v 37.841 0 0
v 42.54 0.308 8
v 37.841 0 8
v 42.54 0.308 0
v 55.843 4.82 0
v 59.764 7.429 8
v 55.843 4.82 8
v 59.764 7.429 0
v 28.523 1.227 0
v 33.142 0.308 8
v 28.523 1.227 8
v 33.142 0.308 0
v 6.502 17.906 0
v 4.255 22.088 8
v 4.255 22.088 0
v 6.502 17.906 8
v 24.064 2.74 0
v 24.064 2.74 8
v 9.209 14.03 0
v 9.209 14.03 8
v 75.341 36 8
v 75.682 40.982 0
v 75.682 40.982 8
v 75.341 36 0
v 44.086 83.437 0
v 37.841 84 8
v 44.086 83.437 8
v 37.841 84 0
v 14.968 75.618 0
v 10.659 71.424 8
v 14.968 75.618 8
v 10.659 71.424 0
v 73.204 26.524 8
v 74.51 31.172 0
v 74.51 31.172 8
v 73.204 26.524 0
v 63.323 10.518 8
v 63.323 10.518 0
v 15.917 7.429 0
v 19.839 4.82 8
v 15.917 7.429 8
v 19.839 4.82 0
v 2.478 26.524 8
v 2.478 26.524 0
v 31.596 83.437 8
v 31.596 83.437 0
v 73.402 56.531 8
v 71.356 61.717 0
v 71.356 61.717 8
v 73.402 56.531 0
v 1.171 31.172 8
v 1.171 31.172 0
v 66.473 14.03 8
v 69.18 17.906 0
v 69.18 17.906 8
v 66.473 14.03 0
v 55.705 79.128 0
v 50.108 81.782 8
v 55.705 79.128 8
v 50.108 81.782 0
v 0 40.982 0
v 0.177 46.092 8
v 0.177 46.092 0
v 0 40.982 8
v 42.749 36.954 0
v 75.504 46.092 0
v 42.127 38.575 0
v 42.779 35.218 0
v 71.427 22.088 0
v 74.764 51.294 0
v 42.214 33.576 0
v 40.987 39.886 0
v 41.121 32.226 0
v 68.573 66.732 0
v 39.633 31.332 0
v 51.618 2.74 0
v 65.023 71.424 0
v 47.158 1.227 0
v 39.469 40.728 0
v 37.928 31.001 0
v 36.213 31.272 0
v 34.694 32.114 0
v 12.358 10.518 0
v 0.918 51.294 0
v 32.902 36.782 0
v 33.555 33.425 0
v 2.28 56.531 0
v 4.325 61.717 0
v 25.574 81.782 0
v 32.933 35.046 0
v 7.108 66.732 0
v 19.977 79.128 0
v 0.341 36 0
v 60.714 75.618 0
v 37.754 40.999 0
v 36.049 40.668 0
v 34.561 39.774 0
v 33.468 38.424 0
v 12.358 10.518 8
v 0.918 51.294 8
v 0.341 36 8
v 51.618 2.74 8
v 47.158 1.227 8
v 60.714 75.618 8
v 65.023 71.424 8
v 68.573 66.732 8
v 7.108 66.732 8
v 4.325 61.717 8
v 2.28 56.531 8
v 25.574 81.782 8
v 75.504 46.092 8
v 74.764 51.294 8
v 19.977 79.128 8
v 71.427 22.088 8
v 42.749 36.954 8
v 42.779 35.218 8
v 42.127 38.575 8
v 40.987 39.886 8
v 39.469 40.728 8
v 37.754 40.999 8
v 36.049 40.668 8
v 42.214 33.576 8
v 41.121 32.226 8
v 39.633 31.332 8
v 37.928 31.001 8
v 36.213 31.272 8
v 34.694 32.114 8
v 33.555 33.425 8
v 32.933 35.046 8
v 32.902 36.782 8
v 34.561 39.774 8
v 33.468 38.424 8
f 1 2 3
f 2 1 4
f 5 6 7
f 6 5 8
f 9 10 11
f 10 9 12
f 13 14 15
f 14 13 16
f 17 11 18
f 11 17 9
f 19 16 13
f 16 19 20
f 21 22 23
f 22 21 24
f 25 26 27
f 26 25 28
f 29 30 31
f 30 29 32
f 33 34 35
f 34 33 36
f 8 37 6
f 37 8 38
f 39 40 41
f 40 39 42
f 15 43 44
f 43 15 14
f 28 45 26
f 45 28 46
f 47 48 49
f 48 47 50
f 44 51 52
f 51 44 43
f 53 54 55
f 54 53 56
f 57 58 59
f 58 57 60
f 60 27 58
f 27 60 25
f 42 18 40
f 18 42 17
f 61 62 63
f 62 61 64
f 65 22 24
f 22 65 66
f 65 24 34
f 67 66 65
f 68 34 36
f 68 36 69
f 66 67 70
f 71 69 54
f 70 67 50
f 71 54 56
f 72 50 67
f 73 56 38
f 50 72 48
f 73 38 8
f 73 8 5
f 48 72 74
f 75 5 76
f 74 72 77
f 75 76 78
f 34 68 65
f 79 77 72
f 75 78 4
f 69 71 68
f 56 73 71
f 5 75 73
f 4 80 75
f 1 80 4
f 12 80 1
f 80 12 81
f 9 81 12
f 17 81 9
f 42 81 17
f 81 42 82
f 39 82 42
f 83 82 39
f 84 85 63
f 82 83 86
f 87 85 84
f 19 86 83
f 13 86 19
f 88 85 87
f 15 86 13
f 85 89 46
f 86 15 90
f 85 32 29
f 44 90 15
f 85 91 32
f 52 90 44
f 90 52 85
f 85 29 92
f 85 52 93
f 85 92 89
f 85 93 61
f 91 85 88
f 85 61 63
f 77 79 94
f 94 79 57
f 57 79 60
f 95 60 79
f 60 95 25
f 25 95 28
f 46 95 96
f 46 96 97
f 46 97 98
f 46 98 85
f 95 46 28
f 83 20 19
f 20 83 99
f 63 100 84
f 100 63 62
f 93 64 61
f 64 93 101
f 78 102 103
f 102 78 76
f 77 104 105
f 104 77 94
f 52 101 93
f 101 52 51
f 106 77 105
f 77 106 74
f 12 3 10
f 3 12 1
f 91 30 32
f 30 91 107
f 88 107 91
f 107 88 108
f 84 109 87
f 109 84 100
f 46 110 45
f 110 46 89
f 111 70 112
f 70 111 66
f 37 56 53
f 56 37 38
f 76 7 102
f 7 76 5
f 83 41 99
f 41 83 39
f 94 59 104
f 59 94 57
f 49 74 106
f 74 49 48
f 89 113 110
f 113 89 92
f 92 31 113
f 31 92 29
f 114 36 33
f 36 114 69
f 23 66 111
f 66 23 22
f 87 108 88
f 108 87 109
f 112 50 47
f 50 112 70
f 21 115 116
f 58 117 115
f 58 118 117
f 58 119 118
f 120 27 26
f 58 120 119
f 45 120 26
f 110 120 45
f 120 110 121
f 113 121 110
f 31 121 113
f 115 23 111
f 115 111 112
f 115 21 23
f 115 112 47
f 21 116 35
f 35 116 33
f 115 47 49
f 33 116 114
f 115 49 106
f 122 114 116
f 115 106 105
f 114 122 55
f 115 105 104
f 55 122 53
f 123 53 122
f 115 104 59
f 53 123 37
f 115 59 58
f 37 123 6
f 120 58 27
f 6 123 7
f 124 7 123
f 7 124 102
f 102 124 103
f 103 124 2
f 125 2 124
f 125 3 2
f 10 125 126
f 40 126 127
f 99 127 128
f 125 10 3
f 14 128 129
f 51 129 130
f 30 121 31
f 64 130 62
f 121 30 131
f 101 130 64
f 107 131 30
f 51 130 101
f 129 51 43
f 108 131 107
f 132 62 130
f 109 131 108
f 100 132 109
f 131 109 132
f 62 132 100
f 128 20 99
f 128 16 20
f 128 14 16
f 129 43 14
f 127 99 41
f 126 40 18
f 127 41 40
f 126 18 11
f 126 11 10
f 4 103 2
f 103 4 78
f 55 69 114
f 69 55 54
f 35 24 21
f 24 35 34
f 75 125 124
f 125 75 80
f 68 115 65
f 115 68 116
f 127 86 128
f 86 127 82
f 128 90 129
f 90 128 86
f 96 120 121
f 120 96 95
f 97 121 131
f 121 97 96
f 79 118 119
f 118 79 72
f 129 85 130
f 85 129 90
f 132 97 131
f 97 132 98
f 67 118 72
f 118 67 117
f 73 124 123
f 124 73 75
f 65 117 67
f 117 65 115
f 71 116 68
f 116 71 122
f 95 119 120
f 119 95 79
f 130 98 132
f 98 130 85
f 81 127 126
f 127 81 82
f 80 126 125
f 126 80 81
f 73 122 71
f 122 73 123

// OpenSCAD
$fn = 32;

// ----------------------------------------------------------------------
// Cam plate: single_lobe cam, base R36
// ----------------------------------------------------------------------

// --- parameters (mm) ---
base_r = 36;              // base circle radius
lobe_h = 12;              // cam lobe rise
bore_r = 5;               // shaft bore radius
plate_t = 8;              // plate thickness, Z (extrusion height)

profile = [[75.341, 36], [75.682, 40.982], [75.504, 46.092], [74.764, 51.294], [73.402, 56.531], [71.356, 61.717], [68.573, 66.732], [65.023, 71.424], [60.714, 75.618], [55.705, 79.128], [50.108, 81.782], [44.086, 83.437], [37.841, 84], [31.596, 83.437], [25.574, 81.782], [19.977, 79.128], [14.968, 75.618], [10.659, 71.424], [7.108, 66.732], [4.325, 61.717], [2.28, 56.531], [0.918, 51.294], [0.177, 46.092], [0, 40.982], [0.341, 36], [1.171, 31.172], [2.478, 26.524], [4.255, 22.088], [6.502, 17.906], [9.209, 14.03], [12.358, 10.518], [15.917, 7.429], [19.839, 4.82], [24.064, 2.74], [28.523, 1.227], [33.142, 0.308], [37.841, 0], [42.54, 0.308], [47.158, 1.227], [51.618, 2.74], [55.843, 4.82], [59.764, 7.429], [63.323, 10.518], [66.473, 14.03], [69.18, 17.906], [71.427, 22.088], [73.204, 26.524], [74.51, 31.172]];  // primary outline, 48 points, counter clockwise
void_1 = [[42.749, 36.954], [42.127, 38.575], [40.987, 39.886], [39.469, 40.728], [37.754, 40.999], [36.049, 40.668], [34.561, 39.774], [33.468, 38.424], [32.902, 36.782], [32.933, 35.046], [33.555, 33.425], [34.694, 32.114], [36.213, 31.272], [37.928, 31.001], [39.633, 31.332], [41.121, 32.226], [42.214, 33.576], [42.779, 35.218]];  // shaft bore, 18 points

// --- the one profile operation ---
difference() {
  linear_extrude(height = plate_t) polygon(points = profile);
  translate([0, 0, -1])
    linear_extrude(height = plate_t + 2) polygon(points = void_1);
}
